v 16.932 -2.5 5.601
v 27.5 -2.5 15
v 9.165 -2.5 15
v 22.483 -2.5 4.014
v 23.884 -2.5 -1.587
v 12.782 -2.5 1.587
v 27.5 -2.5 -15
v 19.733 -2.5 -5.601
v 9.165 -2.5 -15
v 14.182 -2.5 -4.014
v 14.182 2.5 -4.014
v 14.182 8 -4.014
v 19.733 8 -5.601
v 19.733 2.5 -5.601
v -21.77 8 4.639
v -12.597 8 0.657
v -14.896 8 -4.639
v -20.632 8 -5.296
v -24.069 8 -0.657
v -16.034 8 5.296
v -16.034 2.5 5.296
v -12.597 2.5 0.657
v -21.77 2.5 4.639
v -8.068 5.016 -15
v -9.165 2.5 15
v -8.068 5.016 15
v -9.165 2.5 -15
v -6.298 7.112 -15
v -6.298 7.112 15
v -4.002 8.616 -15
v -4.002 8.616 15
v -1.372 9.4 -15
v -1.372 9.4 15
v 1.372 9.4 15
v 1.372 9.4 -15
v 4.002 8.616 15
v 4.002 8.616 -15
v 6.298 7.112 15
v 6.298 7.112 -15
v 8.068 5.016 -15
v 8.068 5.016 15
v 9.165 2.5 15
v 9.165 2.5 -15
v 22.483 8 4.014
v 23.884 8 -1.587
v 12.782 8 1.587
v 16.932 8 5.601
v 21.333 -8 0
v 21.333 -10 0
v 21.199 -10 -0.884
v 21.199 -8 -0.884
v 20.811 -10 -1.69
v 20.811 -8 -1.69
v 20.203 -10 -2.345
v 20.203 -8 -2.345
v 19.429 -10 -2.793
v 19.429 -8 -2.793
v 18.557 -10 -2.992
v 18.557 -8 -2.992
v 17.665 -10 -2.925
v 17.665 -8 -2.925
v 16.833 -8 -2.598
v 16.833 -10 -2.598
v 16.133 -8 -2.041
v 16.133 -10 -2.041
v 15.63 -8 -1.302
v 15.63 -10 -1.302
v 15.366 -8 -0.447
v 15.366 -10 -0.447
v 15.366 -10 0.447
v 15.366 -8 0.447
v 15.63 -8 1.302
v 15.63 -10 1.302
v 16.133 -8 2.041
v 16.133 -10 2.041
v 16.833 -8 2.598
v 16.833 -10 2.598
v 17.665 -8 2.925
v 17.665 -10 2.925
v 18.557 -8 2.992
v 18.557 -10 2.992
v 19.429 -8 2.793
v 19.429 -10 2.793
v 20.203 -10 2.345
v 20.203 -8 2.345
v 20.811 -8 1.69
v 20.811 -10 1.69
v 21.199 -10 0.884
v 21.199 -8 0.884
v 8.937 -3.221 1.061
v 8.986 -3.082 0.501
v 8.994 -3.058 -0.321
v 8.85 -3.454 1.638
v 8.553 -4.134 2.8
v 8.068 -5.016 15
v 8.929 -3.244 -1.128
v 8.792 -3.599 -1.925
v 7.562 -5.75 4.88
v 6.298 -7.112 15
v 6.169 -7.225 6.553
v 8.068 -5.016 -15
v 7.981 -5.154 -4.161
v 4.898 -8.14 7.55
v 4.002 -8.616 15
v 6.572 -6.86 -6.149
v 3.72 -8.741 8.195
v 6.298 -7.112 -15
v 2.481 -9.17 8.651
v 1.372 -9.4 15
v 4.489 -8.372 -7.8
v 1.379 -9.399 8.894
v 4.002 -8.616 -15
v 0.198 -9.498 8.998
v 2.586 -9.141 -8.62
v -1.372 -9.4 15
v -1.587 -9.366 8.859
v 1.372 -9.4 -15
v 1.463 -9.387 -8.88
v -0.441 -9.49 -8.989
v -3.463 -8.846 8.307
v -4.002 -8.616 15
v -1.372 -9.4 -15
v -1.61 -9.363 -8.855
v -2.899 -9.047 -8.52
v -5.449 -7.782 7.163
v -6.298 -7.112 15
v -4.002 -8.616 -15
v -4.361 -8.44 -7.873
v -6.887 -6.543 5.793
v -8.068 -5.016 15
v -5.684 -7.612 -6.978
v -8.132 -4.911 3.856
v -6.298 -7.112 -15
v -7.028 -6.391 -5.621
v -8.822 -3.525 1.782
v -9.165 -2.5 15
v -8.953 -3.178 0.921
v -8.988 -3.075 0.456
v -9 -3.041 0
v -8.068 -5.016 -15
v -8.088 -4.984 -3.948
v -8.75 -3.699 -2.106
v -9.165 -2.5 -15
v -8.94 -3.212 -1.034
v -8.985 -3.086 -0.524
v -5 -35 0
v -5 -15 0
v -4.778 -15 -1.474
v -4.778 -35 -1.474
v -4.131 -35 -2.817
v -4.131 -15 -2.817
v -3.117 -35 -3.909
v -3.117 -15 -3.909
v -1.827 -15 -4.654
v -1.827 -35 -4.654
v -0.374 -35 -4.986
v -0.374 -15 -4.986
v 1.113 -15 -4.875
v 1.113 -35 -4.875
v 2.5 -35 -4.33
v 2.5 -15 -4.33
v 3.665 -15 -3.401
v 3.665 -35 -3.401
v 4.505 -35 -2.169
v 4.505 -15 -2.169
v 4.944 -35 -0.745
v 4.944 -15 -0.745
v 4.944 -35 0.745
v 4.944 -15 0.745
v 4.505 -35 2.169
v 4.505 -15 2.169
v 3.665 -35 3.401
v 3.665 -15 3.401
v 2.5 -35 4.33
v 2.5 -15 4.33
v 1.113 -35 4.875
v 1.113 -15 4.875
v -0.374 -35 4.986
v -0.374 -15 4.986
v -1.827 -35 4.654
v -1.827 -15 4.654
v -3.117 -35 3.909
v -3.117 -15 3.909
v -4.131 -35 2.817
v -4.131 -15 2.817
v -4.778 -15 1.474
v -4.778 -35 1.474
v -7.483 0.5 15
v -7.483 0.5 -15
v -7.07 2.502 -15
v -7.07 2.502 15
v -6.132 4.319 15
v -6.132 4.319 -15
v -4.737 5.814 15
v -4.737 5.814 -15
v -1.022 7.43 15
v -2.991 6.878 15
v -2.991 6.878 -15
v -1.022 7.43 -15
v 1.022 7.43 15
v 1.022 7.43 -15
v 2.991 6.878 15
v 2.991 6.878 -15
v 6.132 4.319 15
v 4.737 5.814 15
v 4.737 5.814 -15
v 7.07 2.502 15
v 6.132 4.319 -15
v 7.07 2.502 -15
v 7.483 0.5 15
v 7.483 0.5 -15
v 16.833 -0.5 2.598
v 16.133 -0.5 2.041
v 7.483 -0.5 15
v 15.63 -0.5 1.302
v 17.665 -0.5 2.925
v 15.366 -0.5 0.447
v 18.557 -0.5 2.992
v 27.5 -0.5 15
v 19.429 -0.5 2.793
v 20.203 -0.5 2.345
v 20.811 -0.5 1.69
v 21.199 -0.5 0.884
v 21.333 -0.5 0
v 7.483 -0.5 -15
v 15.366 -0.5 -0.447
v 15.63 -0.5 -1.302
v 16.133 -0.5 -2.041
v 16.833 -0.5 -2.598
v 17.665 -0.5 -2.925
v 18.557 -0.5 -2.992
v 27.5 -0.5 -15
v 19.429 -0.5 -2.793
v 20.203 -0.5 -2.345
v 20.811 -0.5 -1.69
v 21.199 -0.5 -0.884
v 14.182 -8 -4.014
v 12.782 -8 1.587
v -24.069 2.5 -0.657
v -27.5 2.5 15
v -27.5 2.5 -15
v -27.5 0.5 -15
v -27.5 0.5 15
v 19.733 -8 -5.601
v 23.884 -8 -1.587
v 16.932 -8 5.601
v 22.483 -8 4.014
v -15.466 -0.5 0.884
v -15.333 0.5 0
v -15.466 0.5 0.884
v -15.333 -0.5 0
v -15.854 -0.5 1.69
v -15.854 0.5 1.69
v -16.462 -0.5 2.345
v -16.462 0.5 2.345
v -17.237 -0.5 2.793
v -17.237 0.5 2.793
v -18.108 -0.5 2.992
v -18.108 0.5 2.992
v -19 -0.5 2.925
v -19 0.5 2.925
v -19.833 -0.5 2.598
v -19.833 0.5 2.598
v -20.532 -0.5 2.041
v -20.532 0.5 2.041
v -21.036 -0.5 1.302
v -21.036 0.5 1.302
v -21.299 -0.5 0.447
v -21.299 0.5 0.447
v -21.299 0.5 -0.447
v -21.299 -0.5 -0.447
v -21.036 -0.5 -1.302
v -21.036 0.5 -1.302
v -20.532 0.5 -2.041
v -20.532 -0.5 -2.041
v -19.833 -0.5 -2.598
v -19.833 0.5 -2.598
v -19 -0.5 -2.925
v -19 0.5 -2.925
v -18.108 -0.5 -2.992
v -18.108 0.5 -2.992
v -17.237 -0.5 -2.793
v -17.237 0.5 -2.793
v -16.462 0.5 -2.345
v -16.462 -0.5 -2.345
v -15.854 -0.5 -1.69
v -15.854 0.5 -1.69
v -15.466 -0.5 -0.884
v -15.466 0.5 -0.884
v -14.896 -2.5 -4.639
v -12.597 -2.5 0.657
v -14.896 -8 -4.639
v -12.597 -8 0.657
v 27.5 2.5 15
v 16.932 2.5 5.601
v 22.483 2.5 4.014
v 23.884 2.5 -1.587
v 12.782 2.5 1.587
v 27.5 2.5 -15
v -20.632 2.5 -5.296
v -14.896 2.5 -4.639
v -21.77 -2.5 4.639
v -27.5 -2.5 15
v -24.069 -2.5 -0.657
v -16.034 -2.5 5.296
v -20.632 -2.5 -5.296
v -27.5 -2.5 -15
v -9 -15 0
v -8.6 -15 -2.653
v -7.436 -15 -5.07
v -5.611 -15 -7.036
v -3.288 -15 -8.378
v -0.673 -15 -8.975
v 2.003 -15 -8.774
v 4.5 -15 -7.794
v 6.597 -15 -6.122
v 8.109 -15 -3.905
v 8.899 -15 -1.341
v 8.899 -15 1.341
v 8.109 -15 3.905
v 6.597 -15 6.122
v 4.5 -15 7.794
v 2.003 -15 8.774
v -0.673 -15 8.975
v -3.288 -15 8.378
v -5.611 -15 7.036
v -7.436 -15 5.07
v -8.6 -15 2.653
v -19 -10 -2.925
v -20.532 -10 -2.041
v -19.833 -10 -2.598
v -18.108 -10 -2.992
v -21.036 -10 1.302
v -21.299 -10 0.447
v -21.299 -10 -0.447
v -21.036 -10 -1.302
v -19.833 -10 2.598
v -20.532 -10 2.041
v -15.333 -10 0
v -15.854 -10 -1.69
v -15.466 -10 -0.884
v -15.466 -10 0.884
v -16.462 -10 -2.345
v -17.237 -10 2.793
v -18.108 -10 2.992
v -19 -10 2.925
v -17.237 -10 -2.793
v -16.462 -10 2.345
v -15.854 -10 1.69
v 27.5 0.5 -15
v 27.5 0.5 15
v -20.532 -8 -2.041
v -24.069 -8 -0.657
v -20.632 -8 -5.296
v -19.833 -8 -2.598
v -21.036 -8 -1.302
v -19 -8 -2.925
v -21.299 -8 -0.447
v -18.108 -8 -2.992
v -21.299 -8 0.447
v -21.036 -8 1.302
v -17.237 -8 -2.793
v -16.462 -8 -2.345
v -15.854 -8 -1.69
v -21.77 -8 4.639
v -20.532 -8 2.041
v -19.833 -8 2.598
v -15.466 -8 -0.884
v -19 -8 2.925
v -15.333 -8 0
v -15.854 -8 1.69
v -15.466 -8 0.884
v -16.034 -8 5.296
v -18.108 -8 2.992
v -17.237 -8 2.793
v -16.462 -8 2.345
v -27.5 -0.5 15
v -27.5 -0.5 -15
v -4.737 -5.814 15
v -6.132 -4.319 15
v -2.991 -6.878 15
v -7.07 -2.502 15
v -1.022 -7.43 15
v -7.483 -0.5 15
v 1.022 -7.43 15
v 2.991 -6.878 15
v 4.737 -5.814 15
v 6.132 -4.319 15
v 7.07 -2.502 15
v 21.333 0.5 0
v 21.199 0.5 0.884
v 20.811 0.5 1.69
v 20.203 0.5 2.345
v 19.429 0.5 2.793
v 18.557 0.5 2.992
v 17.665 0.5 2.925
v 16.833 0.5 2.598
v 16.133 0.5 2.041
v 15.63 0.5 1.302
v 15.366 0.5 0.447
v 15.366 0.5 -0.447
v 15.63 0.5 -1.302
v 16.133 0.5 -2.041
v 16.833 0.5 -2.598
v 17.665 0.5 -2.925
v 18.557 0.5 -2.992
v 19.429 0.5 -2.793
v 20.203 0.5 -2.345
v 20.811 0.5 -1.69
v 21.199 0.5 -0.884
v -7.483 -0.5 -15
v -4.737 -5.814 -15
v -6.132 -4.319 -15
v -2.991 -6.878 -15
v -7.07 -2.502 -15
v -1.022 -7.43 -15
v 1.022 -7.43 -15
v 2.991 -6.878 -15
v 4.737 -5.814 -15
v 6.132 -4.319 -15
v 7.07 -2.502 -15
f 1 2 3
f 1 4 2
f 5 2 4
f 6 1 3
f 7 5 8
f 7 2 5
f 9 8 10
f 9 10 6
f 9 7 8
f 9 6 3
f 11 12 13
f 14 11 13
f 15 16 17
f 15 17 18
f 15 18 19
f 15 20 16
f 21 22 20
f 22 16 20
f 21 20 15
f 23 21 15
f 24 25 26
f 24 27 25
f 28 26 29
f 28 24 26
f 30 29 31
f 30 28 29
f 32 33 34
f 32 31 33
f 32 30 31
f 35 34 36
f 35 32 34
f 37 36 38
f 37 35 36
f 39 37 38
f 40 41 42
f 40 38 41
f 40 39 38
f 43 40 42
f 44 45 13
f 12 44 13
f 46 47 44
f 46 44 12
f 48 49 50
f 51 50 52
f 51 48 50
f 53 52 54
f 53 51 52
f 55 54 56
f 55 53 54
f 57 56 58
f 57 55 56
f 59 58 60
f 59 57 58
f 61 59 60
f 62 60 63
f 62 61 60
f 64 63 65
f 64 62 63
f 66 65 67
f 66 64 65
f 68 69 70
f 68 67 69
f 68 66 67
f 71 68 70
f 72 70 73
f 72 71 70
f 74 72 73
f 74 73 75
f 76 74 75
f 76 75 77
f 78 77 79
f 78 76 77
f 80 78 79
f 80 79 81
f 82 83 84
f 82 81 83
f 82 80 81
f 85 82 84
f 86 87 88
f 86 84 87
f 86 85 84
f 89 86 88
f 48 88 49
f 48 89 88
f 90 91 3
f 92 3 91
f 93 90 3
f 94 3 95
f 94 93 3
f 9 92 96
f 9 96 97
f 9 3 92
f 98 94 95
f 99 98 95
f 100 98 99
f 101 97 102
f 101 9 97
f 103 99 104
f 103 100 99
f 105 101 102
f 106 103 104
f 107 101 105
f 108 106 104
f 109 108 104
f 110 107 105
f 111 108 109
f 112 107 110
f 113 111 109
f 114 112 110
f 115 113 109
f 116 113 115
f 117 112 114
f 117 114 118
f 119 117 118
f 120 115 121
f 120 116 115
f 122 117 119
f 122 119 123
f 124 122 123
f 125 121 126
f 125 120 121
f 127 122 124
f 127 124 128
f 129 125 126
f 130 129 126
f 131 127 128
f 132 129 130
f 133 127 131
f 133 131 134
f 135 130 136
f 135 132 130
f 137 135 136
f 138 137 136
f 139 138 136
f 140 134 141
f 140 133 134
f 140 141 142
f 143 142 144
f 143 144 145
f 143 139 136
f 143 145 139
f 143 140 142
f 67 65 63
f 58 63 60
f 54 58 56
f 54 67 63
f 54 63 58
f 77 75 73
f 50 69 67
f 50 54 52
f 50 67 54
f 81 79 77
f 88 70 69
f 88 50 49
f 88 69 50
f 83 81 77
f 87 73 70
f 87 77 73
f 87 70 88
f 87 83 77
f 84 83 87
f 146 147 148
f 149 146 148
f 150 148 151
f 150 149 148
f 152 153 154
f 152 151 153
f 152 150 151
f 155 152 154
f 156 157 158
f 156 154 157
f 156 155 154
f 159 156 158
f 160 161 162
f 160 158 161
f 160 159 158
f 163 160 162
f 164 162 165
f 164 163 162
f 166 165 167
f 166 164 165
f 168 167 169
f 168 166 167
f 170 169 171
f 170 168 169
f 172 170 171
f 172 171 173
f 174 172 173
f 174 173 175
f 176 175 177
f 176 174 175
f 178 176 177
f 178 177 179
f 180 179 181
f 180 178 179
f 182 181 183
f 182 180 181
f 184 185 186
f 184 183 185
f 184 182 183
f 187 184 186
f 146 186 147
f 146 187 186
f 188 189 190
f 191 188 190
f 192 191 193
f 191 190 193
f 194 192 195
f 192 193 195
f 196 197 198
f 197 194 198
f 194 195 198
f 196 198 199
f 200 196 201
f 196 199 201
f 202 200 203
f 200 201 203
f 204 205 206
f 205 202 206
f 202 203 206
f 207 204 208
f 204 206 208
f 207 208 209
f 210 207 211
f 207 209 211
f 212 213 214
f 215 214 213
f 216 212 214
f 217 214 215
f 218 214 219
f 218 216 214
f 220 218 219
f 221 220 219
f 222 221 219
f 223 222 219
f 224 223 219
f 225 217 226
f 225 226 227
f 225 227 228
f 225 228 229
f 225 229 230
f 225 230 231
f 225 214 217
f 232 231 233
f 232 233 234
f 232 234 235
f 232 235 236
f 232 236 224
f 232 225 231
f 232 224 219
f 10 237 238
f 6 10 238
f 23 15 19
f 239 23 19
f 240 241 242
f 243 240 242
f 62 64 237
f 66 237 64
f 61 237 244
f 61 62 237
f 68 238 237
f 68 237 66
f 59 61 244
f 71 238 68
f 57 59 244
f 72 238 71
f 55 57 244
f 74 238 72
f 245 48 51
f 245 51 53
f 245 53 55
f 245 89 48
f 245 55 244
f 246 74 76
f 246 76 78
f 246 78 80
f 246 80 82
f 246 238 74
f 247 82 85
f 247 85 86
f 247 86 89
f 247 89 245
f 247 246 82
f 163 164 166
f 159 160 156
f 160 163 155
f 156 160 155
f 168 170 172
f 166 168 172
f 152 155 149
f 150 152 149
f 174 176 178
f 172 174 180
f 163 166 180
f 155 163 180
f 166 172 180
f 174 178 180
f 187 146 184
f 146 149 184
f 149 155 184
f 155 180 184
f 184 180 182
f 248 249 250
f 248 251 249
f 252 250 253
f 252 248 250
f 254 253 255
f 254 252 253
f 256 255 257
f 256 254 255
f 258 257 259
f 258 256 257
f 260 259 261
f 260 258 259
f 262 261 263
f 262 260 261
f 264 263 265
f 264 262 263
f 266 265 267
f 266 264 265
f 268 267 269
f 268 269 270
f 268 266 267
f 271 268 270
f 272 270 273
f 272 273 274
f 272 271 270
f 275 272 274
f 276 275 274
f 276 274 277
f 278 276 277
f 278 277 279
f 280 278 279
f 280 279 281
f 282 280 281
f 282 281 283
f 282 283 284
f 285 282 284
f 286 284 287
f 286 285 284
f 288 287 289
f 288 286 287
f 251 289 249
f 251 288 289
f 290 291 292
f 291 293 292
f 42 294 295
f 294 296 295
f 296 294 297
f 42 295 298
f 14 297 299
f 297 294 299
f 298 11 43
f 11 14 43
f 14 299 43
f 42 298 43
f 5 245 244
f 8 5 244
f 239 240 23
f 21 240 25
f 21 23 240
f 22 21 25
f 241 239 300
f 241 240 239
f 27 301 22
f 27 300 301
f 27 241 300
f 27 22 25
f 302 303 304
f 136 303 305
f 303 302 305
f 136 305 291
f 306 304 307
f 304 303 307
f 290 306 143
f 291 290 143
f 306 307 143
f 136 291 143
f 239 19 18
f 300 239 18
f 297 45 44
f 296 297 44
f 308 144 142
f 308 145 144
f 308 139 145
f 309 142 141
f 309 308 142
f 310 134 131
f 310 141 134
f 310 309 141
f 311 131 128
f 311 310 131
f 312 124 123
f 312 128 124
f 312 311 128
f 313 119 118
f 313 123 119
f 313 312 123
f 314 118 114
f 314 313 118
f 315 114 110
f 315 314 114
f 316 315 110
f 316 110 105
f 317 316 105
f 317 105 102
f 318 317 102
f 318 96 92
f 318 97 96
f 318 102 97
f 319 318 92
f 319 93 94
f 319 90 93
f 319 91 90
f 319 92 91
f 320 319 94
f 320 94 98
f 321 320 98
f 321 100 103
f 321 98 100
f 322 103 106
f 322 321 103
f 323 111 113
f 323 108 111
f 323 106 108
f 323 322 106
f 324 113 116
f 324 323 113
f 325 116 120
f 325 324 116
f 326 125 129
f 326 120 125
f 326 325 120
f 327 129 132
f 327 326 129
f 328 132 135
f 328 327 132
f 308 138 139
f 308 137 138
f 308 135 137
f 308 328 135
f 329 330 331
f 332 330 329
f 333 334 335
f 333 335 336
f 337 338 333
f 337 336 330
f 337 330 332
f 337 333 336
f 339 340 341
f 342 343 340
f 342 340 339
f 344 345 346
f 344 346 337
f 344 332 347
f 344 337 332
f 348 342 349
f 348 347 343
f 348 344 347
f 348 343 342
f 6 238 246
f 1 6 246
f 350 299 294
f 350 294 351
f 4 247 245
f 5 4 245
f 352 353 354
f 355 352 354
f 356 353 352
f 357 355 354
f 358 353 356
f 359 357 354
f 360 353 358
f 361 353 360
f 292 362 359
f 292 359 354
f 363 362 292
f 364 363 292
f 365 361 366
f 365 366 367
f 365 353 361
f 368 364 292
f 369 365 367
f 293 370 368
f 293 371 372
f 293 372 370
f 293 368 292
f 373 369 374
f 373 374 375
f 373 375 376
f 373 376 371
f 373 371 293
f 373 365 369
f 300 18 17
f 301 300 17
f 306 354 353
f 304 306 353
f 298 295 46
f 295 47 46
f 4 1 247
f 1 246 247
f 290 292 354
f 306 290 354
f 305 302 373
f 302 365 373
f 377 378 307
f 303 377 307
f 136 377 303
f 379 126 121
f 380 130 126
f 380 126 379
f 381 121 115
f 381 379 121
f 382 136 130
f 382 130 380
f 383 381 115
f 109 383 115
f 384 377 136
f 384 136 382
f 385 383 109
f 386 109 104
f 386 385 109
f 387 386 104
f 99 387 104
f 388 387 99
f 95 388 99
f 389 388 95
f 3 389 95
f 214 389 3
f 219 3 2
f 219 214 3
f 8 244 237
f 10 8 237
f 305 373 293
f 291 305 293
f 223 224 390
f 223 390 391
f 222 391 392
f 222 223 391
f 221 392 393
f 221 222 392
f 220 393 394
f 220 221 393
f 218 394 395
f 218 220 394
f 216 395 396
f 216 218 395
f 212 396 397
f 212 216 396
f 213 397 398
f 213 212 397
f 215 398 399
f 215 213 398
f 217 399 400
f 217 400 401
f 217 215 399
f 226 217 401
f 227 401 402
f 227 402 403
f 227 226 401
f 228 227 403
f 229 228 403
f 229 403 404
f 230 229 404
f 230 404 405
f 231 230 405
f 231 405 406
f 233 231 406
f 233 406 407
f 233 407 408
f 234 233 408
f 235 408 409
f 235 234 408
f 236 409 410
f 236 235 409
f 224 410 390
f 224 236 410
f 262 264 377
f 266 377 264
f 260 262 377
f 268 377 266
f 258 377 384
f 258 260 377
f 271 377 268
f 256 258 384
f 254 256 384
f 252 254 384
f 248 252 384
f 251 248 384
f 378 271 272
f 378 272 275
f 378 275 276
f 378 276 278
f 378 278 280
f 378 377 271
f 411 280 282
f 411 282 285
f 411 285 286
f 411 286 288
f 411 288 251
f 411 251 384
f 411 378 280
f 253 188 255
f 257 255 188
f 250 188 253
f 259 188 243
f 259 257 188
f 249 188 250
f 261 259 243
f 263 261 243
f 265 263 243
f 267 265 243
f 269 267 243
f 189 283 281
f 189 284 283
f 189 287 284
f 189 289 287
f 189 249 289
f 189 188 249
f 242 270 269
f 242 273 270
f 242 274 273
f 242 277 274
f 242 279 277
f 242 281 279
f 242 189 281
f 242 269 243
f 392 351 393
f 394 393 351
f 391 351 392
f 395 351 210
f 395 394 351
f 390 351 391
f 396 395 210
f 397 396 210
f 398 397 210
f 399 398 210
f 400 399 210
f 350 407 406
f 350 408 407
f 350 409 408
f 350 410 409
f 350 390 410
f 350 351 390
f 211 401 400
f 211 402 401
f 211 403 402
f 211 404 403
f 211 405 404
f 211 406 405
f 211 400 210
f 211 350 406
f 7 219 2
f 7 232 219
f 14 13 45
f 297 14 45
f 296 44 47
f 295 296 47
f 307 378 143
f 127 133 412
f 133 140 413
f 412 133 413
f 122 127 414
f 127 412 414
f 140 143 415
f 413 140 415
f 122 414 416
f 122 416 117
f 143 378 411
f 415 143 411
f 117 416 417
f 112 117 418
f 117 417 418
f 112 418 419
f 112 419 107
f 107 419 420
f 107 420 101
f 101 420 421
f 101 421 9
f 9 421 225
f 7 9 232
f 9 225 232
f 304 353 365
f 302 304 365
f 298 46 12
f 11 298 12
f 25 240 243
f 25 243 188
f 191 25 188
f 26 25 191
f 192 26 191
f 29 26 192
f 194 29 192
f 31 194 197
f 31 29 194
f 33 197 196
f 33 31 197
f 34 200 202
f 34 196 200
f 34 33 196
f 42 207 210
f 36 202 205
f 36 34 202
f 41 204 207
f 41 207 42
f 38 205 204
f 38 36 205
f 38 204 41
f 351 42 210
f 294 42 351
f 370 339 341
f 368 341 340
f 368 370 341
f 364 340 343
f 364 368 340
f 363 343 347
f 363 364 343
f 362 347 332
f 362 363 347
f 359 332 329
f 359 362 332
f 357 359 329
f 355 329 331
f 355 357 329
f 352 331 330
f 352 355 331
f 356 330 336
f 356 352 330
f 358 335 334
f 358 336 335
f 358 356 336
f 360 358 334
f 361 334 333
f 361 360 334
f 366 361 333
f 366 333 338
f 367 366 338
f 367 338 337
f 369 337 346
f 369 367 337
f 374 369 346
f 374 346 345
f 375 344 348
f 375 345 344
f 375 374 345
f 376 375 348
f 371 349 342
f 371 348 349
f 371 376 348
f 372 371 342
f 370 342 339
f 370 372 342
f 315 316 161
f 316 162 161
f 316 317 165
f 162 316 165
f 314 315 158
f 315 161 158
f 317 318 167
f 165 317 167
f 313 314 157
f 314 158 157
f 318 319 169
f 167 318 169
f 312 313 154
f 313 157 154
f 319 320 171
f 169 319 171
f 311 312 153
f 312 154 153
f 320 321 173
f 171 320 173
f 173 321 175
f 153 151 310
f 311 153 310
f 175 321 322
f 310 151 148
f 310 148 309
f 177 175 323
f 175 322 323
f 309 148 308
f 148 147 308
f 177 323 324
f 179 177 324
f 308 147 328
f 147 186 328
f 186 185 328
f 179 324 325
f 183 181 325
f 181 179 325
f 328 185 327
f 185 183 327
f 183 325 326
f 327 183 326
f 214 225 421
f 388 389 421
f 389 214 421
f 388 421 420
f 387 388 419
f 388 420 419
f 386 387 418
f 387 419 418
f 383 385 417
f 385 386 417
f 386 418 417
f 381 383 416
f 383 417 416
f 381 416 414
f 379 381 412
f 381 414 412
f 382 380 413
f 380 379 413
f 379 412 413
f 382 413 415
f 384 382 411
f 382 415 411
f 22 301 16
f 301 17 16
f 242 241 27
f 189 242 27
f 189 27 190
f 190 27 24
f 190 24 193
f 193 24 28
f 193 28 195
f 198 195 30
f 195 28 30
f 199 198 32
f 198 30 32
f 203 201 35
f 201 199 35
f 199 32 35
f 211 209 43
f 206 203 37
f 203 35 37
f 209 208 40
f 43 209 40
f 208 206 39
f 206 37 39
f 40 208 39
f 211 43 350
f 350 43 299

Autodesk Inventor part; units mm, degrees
sketch "Sketch1" plane through (0, 0, 0) normal (0, 0, 1) x (1, 0, 0)
  circle A0 centre (0, 0) radius 7.5
  circle A1 centre (0, 0) radius 9.5
  dimension "d0" = 15
  dimension "d1" = 2
extrude "Extrusion1" add sketch "Sketch1" along normal mid plane 30
sketch "Sketch3" plane through (0, 0, 0) normal (0, 0, 1) x (1, 0, 0)
  circle A0 centre (0, 0) radius 9.5 projected
  line L0 (-27.5, 2.5) -> (-27.5, -2.5)
  line L1 (-27.5, 2.5) -> (-9.1652, 2.5)
  line L2 (-27.5, -2.5) -> (-9.1652, -2.5)
  line L3 (27.5, 2.5) -> (27.5, -2.5)
  line L4 (27.5, 2.5) -> (9.1652, 2.5)
  line L5 (27.5, -2.5) -> (9.1652, -2.5)
  point P0 (-27.5, 0)
  point P1 (27.5, 0)
  dimension "d4" = 5
  dimension "d6" = 5
  dimension "d22" = 27.5
  dimension "d23" = 27.5
extrude "Extrusion2" add sketch "Sketch3" along normal mid plane 30 contours A0 L4 L3 L5 | A0 L2 L0 L1
sketch "Sketch10" plane through (0, 0, 0) normal (0, 0, 1) x (1, 0, 0)
  line L0 (-27.5, -2.5) -> (-27.5, 2.5) projected
  line L1 (27.5, 2.5) -> (27.5, -2.5) projected
  line L2 (-27.5, -0.5) -> (27.5, -0.5)
  line L3 (27.5, -0.5) -> (27.5, 0.5)
  line L4 (27.5, 0.5) -> (-27.5, 0.5)
  line L5 (-27.5, 0.5) -> (-27.5, -0.5)
  line L6 (27.5, -2.5) -> (9.1652, -2.5) projected
  line L7 (9.1652, 2.5) -> (27.5, 2.5) projected
  point P0 (0, 0)
  dimension "d28" = 2
  dimension "d29" = 2
extrude "Extrusion7" cut sketch "Sketch10" along normal through all both and the other way through all
sketch "Sketch4" plane through (-27.5, -2.5, -15) normal (0, -1, 0) x (1, 0, 0)
  line L0 (18.3348, 30) -> (0, 30) projected
  line L1 (0, 0) -> (0, 30) projected
  line L2 (55, 30) -> (36.6652, 30) projected
  line L3 (36.6652, 0) -> (36.6652, 30) projected
  line L4 (36.6652, 0) -> (55, 0) projected
  line L5 (55, 0) -> (55, 30) projected
  circle A0 centre (9.1674, 15) radius 3
  circle A1 centre (45.8326, 15) radius 3
  point P0 (0, 15)
  point P1 (9.1674, 30)
  point P2 (45.8326, 30)
  point P3 (55, 15)
  dimension "d10" = 6
  dimension "d11" = 6
extrude "Extrusion3" add sketch "Sketch4" along normal mid plane 15 contours A0 | A1
ref_plane "Work Plane1" through (0, 8, 0) normal (0, 1, 0) x (-1, 0, 0)
sketch "Sketch6" plane through (0, 8, 0) normal (0, 1, 0) x (-1, 0, 0)
  circle A0 centre (-18.3326, 0) radius 3 projected
  circle A1 centre (18.3326, 0) radius 3 projected
  line L0 (-19.7333, -5.601) -> (-23.8836, -1.5874)
  line L1 (-23.8836, -1.5874) -> (-22.4828, 4.0136)
  line L2 (-22.4828, 4.0136) -> (-16.9318, 5.601)
  line L3 (-16.9318, 5.601) -> (-12.7816, 1.5874)
  line L4 (-12.7816, 1.5874) -> (-14.1824, -4.0136)
  line L5 (-14.1824, -4.0136) -> (-19.7333, -5.601)
  line L6 (20.6316, -5.296) -> (14.8956, -4.639)
  line L7 (14.8956, -4.639) -> (12.5966, 0.657)
  line L8 (12.5966, 0.657) -> (16.0335, 5.296)
  line L9 (16.0335, 5.296) -> (21.7695, 4.639)
  line L10 (21.7695, 4.639) -> (24.0686, -0.657)
  line L11 (24.0686, -0.657) -> (20.6316, -5.296)
  dimension "d15" = 10
extrude "Extrusion4" add sketch "Sketch6" against normal up to surface (5.5 mm away) contours A0 | A1 | L0 L1 L2 L3 L4 L5 | L6 L7 L8 L9 L10 L11
ref_plane "Length_WKP" through (0, -35, 0) normal (0, 1, 0) x (-1, 0, 0)
sketch "Sketch8" plane through (0, -35, 0) normal (0, 1, 0) x (-1, 0, 0)
  line L0 (-38.5, 0) -> (38.5, 0) projected
  line L1 (0, -21) -> (0, 21) projected
  circle A0 centre (0, 0) radius 5
  dimension "d19" = 10
extrude "Extrusion5" add sketch "Sketch8" along normal up to next
ref_plane "Work Plane3" through (0, -15, 0) normal (0, 1, 0) x (-1, 0, 0)
sketch "Sketch9" plane through (0, -15, 0) normal (0, 1, 0) x (-1, 0, 0)
  circle A0 centre (0, 0) radius 5 projected
  circle A1 centre (0, 0) radius 9
  dimension "d25" = 4
extrude "Extrusion6" add sketch "Sketch9" along normal up to next
mirror "Mirror1" about plane through (0, 0, 0) normal (0, 1, 0) of "Extrusion4"
equation "\"d0\" = dia"
equation "\"d2\" = Bredde"
equation "\"d8\" = Bredde"
equation "\"d29\" = d28"
equation "\"d11\" = d10"
equation "\"dia\" = 15"
equation "\"Bredde\" = 30"
properties part number "Pipe Clamp - Ø25" material "Stainless Steel"
